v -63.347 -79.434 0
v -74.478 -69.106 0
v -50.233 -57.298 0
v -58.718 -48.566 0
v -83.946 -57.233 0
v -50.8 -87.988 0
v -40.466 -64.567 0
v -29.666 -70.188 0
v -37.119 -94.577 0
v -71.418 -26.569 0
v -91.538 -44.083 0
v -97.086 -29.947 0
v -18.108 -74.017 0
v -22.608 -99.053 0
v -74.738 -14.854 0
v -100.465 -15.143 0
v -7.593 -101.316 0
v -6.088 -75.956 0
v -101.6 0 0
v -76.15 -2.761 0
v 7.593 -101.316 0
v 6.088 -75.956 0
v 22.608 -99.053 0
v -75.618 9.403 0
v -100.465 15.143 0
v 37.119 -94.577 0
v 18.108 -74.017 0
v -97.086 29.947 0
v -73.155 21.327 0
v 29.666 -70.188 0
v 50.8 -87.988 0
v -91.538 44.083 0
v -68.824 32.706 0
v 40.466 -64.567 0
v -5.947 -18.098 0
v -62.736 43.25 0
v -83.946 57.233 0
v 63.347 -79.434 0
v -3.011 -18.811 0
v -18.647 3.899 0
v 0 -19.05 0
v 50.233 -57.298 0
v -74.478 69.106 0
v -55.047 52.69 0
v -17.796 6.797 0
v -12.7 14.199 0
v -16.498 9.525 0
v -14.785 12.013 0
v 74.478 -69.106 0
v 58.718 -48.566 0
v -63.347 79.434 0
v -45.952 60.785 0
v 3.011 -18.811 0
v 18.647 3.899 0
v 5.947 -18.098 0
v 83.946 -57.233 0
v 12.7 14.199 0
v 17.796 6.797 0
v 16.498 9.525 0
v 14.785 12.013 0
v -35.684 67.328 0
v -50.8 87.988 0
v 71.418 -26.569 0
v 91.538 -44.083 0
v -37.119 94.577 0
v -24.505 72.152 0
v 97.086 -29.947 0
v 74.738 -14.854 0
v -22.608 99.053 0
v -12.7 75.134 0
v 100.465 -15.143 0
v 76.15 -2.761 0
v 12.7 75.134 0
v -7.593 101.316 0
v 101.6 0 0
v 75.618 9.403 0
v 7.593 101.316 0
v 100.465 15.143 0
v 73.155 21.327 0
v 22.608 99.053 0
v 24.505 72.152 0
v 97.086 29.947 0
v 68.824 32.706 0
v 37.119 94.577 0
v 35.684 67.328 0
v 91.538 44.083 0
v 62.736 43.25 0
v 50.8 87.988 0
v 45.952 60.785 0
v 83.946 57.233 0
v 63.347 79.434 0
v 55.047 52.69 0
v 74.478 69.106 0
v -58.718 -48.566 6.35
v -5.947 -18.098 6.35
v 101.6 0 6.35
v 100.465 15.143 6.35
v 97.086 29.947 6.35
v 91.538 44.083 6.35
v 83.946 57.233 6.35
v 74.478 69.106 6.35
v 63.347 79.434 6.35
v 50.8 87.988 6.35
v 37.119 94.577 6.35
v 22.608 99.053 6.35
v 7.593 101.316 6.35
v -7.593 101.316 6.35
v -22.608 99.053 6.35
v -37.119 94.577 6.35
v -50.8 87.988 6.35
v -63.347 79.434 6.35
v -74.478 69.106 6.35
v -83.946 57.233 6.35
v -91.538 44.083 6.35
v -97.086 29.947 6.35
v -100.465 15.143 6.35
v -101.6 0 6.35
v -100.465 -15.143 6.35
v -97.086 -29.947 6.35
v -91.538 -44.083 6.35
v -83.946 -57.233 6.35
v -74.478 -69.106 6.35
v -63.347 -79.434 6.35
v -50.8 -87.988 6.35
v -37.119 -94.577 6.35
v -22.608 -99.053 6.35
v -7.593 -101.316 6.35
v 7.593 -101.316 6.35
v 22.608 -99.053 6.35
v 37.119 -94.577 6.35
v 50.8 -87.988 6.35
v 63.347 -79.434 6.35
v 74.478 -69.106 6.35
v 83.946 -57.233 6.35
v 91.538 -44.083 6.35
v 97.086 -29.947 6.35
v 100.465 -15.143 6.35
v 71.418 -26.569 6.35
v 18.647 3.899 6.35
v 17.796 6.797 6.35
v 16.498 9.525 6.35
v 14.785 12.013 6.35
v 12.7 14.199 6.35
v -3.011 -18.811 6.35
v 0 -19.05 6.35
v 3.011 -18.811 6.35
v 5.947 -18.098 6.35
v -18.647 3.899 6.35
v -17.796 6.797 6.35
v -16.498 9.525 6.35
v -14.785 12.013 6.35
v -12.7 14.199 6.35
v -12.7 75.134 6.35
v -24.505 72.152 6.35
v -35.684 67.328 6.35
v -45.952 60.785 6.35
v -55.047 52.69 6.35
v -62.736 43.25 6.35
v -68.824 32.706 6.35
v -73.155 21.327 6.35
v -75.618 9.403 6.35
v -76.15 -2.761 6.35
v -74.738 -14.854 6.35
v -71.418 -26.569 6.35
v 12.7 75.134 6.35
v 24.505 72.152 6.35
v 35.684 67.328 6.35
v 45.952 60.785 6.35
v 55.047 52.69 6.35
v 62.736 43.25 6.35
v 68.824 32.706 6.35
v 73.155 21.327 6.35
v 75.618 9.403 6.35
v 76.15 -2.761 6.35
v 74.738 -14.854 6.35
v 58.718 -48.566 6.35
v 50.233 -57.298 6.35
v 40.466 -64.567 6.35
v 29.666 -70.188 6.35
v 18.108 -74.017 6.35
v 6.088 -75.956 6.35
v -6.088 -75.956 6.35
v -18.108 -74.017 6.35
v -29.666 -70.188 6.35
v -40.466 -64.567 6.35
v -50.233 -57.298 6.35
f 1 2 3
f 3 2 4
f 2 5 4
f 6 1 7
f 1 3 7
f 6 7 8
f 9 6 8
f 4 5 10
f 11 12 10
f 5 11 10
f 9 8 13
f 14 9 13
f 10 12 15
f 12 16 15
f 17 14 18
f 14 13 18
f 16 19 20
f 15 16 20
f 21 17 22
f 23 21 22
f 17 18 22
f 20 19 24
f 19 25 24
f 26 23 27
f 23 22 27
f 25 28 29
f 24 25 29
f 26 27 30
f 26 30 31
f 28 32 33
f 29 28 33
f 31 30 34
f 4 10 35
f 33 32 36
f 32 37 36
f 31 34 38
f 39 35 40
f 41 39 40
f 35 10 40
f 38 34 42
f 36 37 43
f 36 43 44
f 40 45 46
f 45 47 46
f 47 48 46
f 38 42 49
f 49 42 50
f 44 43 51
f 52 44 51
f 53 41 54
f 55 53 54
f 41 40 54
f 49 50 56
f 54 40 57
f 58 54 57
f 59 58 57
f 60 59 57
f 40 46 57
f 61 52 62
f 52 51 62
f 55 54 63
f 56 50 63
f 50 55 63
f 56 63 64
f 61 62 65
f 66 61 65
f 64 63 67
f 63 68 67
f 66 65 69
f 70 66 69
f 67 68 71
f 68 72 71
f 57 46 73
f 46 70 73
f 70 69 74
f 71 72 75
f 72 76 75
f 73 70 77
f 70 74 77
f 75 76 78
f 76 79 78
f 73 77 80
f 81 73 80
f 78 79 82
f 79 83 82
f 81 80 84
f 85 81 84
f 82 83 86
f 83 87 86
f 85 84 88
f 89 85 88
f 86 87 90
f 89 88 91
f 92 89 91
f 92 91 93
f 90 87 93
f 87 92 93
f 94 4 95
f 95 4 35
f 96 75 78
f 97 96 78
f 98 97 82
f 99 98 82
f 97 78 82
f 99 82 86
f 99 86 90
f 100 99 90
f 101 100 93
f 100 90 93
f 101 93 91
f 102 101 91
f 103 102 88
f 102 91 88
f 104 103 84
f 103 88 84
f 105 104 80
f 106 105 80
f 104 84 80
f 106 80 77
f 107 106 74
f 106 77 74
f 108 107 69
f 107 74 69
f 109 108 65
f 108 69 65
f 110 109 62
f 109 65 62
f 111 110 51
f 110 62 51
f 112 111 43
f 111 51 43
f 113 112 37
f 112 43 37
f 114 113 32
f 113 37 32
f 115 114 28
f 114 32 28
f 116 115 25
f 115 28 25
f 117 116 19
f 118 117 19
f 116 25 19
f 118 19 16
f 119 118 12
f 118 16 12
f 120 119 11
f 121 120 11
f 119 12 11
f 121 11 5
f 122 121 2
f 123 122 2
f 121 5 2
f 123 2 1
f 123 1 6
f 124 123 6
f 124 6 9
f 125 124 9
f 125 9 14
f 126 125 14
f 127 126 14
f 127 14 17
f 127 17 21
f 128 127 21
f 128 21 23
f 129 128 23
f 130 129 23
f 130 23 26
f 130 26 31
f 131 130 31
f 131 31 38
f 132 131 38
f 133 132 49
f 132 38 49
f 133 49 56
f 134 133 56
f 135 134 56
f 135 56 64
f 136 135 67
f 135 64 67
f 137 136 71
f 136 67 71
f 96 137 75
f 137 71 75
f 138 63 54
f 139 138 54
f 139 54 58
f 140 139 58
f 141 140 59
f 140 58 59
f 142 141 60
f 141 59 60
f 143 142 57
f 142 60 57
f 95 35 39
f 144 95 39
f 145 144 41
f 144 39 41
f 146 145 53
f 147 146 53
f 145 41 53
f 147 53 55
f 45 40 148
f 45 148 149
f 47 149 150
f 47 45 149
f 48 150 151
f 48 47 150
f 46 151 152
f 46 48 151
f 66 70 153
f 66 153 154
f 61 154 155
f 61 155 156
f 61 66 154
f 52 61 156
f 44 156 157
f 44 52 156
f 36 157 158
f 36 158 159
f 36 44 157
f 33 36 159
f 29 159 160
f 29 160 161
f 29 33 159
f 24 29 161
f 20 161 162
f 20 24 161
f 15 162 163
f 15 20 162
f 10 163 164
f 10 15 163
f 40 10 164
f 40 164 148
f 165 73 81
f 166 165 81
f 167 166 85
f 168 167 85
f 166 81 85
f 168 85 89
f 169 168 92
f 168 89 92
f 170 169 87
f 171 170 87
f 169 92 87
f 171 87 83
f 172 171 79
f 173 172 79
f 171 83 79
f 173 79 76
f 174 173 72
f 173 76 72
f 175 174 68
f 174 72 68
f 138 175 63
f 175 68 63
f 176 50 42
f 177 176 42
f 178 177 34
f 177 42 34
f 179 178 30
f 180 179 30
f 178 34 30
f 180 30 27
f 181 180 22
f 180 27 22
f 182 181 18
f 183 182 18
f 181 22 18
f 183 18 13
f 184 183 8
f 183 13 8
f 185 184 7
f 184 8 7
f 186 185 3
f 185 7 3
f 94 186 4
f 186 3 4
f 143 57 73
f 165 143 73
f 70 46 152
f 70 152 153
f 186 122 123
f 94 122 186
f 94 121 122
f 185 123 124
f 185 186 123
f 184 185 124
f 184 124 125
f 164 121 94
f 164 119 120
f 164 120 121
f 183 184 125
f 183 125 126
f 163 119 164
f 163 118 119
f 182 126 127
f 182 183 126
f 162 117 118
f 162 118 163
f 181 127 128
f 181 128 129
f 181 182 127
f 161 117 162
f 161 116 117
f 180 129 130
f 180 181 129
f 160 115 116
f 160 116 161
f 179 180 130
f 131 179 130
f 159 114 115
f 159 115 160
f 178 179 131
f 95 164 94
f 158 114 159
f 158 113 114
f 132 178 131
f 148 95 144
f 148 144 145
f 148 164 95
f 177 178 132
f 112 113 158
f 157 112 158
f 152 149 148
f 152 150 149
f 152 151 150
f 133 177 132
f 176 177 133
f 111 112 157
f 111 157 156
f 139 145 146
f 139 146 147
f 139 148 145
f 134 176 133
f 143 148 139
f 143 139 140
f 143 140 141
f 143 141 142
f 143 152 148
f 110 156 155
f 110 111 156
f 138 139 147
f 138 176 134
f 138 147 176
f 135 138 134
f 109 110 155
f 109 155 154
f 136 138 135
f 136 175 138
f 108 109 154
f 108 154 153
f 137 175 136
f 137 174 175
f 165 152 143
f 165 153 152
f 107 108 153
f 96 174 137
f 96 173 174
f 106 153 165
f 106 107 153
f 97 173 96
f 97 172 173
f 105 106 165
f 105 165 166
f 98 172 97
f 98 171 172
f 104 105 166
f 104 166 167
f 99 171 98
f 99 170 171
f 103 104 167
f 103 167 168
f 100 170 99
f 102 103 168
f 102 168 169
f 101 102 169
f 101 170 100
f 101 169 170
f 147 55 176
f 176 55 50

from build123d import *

# Parameters (mm, degrees)
SKETCH1_R           = 101.6
BOSS_EXTRUDE1_DEPTH = 6.35


with BuildPart() as part:
    # Sketch1 → Boss-Extrude1 (new body)
    with BuildSketch(Plane.XY):
        Circle(SKETCH1_R)
        with BuildLine():
            Line((-12.7, 14.199031657), (-12.7, 75.134213245))
            ThreePointArc((-12.7, 75.134213245), (-65.991135768, 38.1), (-71.418137364, -26.568583995))
            Line((-71.418137364, -26.568583995), (-18.646722124, 3.8990068))
            ThreePointArc((-18.646722124, 3.8990068), (-16.497783942, 9.525), (-12.7, 14.199031657))
        make_face(mode=Mode.SUBTRACT)
        with BuildLine():
            Line((12.7, 14.199031657), (12.7, 75.134213245))
            ThreePointArc((12.7, 75.134213245), (65.991135768, 38.1), (71.418137364, -26.568583995))
            Line((71.418137364, -26.568583995), (18.646722124, 3.8990068))
            ThreePointArc((18.646722124, 3.8990068), (16.497783942, 9.525), (12.7, 14.199031657))
        make_face(mode=Mode.SUBTRACT)
        with BuildLine():
            Line((5.946722124, -18.098038457), (58.718137364, -48.565629251))
            ThreePointArc((58.718137364, -48.565629251), (0, -76.2), (-58.718137364, -48.565629251))
            Line((-58.718137364, -48.565629251), (-5.946722124, -18.098038457))
            ThreePointArc((-5.946722124, -18.098038457), (0, -19.05), (5.946722124, -18.098038457))
        make_face(mode=Mode.SUBTRACT)
    extrude(amount=BOSS_EXTRUDE1_DEPTH)


solid = part.part
